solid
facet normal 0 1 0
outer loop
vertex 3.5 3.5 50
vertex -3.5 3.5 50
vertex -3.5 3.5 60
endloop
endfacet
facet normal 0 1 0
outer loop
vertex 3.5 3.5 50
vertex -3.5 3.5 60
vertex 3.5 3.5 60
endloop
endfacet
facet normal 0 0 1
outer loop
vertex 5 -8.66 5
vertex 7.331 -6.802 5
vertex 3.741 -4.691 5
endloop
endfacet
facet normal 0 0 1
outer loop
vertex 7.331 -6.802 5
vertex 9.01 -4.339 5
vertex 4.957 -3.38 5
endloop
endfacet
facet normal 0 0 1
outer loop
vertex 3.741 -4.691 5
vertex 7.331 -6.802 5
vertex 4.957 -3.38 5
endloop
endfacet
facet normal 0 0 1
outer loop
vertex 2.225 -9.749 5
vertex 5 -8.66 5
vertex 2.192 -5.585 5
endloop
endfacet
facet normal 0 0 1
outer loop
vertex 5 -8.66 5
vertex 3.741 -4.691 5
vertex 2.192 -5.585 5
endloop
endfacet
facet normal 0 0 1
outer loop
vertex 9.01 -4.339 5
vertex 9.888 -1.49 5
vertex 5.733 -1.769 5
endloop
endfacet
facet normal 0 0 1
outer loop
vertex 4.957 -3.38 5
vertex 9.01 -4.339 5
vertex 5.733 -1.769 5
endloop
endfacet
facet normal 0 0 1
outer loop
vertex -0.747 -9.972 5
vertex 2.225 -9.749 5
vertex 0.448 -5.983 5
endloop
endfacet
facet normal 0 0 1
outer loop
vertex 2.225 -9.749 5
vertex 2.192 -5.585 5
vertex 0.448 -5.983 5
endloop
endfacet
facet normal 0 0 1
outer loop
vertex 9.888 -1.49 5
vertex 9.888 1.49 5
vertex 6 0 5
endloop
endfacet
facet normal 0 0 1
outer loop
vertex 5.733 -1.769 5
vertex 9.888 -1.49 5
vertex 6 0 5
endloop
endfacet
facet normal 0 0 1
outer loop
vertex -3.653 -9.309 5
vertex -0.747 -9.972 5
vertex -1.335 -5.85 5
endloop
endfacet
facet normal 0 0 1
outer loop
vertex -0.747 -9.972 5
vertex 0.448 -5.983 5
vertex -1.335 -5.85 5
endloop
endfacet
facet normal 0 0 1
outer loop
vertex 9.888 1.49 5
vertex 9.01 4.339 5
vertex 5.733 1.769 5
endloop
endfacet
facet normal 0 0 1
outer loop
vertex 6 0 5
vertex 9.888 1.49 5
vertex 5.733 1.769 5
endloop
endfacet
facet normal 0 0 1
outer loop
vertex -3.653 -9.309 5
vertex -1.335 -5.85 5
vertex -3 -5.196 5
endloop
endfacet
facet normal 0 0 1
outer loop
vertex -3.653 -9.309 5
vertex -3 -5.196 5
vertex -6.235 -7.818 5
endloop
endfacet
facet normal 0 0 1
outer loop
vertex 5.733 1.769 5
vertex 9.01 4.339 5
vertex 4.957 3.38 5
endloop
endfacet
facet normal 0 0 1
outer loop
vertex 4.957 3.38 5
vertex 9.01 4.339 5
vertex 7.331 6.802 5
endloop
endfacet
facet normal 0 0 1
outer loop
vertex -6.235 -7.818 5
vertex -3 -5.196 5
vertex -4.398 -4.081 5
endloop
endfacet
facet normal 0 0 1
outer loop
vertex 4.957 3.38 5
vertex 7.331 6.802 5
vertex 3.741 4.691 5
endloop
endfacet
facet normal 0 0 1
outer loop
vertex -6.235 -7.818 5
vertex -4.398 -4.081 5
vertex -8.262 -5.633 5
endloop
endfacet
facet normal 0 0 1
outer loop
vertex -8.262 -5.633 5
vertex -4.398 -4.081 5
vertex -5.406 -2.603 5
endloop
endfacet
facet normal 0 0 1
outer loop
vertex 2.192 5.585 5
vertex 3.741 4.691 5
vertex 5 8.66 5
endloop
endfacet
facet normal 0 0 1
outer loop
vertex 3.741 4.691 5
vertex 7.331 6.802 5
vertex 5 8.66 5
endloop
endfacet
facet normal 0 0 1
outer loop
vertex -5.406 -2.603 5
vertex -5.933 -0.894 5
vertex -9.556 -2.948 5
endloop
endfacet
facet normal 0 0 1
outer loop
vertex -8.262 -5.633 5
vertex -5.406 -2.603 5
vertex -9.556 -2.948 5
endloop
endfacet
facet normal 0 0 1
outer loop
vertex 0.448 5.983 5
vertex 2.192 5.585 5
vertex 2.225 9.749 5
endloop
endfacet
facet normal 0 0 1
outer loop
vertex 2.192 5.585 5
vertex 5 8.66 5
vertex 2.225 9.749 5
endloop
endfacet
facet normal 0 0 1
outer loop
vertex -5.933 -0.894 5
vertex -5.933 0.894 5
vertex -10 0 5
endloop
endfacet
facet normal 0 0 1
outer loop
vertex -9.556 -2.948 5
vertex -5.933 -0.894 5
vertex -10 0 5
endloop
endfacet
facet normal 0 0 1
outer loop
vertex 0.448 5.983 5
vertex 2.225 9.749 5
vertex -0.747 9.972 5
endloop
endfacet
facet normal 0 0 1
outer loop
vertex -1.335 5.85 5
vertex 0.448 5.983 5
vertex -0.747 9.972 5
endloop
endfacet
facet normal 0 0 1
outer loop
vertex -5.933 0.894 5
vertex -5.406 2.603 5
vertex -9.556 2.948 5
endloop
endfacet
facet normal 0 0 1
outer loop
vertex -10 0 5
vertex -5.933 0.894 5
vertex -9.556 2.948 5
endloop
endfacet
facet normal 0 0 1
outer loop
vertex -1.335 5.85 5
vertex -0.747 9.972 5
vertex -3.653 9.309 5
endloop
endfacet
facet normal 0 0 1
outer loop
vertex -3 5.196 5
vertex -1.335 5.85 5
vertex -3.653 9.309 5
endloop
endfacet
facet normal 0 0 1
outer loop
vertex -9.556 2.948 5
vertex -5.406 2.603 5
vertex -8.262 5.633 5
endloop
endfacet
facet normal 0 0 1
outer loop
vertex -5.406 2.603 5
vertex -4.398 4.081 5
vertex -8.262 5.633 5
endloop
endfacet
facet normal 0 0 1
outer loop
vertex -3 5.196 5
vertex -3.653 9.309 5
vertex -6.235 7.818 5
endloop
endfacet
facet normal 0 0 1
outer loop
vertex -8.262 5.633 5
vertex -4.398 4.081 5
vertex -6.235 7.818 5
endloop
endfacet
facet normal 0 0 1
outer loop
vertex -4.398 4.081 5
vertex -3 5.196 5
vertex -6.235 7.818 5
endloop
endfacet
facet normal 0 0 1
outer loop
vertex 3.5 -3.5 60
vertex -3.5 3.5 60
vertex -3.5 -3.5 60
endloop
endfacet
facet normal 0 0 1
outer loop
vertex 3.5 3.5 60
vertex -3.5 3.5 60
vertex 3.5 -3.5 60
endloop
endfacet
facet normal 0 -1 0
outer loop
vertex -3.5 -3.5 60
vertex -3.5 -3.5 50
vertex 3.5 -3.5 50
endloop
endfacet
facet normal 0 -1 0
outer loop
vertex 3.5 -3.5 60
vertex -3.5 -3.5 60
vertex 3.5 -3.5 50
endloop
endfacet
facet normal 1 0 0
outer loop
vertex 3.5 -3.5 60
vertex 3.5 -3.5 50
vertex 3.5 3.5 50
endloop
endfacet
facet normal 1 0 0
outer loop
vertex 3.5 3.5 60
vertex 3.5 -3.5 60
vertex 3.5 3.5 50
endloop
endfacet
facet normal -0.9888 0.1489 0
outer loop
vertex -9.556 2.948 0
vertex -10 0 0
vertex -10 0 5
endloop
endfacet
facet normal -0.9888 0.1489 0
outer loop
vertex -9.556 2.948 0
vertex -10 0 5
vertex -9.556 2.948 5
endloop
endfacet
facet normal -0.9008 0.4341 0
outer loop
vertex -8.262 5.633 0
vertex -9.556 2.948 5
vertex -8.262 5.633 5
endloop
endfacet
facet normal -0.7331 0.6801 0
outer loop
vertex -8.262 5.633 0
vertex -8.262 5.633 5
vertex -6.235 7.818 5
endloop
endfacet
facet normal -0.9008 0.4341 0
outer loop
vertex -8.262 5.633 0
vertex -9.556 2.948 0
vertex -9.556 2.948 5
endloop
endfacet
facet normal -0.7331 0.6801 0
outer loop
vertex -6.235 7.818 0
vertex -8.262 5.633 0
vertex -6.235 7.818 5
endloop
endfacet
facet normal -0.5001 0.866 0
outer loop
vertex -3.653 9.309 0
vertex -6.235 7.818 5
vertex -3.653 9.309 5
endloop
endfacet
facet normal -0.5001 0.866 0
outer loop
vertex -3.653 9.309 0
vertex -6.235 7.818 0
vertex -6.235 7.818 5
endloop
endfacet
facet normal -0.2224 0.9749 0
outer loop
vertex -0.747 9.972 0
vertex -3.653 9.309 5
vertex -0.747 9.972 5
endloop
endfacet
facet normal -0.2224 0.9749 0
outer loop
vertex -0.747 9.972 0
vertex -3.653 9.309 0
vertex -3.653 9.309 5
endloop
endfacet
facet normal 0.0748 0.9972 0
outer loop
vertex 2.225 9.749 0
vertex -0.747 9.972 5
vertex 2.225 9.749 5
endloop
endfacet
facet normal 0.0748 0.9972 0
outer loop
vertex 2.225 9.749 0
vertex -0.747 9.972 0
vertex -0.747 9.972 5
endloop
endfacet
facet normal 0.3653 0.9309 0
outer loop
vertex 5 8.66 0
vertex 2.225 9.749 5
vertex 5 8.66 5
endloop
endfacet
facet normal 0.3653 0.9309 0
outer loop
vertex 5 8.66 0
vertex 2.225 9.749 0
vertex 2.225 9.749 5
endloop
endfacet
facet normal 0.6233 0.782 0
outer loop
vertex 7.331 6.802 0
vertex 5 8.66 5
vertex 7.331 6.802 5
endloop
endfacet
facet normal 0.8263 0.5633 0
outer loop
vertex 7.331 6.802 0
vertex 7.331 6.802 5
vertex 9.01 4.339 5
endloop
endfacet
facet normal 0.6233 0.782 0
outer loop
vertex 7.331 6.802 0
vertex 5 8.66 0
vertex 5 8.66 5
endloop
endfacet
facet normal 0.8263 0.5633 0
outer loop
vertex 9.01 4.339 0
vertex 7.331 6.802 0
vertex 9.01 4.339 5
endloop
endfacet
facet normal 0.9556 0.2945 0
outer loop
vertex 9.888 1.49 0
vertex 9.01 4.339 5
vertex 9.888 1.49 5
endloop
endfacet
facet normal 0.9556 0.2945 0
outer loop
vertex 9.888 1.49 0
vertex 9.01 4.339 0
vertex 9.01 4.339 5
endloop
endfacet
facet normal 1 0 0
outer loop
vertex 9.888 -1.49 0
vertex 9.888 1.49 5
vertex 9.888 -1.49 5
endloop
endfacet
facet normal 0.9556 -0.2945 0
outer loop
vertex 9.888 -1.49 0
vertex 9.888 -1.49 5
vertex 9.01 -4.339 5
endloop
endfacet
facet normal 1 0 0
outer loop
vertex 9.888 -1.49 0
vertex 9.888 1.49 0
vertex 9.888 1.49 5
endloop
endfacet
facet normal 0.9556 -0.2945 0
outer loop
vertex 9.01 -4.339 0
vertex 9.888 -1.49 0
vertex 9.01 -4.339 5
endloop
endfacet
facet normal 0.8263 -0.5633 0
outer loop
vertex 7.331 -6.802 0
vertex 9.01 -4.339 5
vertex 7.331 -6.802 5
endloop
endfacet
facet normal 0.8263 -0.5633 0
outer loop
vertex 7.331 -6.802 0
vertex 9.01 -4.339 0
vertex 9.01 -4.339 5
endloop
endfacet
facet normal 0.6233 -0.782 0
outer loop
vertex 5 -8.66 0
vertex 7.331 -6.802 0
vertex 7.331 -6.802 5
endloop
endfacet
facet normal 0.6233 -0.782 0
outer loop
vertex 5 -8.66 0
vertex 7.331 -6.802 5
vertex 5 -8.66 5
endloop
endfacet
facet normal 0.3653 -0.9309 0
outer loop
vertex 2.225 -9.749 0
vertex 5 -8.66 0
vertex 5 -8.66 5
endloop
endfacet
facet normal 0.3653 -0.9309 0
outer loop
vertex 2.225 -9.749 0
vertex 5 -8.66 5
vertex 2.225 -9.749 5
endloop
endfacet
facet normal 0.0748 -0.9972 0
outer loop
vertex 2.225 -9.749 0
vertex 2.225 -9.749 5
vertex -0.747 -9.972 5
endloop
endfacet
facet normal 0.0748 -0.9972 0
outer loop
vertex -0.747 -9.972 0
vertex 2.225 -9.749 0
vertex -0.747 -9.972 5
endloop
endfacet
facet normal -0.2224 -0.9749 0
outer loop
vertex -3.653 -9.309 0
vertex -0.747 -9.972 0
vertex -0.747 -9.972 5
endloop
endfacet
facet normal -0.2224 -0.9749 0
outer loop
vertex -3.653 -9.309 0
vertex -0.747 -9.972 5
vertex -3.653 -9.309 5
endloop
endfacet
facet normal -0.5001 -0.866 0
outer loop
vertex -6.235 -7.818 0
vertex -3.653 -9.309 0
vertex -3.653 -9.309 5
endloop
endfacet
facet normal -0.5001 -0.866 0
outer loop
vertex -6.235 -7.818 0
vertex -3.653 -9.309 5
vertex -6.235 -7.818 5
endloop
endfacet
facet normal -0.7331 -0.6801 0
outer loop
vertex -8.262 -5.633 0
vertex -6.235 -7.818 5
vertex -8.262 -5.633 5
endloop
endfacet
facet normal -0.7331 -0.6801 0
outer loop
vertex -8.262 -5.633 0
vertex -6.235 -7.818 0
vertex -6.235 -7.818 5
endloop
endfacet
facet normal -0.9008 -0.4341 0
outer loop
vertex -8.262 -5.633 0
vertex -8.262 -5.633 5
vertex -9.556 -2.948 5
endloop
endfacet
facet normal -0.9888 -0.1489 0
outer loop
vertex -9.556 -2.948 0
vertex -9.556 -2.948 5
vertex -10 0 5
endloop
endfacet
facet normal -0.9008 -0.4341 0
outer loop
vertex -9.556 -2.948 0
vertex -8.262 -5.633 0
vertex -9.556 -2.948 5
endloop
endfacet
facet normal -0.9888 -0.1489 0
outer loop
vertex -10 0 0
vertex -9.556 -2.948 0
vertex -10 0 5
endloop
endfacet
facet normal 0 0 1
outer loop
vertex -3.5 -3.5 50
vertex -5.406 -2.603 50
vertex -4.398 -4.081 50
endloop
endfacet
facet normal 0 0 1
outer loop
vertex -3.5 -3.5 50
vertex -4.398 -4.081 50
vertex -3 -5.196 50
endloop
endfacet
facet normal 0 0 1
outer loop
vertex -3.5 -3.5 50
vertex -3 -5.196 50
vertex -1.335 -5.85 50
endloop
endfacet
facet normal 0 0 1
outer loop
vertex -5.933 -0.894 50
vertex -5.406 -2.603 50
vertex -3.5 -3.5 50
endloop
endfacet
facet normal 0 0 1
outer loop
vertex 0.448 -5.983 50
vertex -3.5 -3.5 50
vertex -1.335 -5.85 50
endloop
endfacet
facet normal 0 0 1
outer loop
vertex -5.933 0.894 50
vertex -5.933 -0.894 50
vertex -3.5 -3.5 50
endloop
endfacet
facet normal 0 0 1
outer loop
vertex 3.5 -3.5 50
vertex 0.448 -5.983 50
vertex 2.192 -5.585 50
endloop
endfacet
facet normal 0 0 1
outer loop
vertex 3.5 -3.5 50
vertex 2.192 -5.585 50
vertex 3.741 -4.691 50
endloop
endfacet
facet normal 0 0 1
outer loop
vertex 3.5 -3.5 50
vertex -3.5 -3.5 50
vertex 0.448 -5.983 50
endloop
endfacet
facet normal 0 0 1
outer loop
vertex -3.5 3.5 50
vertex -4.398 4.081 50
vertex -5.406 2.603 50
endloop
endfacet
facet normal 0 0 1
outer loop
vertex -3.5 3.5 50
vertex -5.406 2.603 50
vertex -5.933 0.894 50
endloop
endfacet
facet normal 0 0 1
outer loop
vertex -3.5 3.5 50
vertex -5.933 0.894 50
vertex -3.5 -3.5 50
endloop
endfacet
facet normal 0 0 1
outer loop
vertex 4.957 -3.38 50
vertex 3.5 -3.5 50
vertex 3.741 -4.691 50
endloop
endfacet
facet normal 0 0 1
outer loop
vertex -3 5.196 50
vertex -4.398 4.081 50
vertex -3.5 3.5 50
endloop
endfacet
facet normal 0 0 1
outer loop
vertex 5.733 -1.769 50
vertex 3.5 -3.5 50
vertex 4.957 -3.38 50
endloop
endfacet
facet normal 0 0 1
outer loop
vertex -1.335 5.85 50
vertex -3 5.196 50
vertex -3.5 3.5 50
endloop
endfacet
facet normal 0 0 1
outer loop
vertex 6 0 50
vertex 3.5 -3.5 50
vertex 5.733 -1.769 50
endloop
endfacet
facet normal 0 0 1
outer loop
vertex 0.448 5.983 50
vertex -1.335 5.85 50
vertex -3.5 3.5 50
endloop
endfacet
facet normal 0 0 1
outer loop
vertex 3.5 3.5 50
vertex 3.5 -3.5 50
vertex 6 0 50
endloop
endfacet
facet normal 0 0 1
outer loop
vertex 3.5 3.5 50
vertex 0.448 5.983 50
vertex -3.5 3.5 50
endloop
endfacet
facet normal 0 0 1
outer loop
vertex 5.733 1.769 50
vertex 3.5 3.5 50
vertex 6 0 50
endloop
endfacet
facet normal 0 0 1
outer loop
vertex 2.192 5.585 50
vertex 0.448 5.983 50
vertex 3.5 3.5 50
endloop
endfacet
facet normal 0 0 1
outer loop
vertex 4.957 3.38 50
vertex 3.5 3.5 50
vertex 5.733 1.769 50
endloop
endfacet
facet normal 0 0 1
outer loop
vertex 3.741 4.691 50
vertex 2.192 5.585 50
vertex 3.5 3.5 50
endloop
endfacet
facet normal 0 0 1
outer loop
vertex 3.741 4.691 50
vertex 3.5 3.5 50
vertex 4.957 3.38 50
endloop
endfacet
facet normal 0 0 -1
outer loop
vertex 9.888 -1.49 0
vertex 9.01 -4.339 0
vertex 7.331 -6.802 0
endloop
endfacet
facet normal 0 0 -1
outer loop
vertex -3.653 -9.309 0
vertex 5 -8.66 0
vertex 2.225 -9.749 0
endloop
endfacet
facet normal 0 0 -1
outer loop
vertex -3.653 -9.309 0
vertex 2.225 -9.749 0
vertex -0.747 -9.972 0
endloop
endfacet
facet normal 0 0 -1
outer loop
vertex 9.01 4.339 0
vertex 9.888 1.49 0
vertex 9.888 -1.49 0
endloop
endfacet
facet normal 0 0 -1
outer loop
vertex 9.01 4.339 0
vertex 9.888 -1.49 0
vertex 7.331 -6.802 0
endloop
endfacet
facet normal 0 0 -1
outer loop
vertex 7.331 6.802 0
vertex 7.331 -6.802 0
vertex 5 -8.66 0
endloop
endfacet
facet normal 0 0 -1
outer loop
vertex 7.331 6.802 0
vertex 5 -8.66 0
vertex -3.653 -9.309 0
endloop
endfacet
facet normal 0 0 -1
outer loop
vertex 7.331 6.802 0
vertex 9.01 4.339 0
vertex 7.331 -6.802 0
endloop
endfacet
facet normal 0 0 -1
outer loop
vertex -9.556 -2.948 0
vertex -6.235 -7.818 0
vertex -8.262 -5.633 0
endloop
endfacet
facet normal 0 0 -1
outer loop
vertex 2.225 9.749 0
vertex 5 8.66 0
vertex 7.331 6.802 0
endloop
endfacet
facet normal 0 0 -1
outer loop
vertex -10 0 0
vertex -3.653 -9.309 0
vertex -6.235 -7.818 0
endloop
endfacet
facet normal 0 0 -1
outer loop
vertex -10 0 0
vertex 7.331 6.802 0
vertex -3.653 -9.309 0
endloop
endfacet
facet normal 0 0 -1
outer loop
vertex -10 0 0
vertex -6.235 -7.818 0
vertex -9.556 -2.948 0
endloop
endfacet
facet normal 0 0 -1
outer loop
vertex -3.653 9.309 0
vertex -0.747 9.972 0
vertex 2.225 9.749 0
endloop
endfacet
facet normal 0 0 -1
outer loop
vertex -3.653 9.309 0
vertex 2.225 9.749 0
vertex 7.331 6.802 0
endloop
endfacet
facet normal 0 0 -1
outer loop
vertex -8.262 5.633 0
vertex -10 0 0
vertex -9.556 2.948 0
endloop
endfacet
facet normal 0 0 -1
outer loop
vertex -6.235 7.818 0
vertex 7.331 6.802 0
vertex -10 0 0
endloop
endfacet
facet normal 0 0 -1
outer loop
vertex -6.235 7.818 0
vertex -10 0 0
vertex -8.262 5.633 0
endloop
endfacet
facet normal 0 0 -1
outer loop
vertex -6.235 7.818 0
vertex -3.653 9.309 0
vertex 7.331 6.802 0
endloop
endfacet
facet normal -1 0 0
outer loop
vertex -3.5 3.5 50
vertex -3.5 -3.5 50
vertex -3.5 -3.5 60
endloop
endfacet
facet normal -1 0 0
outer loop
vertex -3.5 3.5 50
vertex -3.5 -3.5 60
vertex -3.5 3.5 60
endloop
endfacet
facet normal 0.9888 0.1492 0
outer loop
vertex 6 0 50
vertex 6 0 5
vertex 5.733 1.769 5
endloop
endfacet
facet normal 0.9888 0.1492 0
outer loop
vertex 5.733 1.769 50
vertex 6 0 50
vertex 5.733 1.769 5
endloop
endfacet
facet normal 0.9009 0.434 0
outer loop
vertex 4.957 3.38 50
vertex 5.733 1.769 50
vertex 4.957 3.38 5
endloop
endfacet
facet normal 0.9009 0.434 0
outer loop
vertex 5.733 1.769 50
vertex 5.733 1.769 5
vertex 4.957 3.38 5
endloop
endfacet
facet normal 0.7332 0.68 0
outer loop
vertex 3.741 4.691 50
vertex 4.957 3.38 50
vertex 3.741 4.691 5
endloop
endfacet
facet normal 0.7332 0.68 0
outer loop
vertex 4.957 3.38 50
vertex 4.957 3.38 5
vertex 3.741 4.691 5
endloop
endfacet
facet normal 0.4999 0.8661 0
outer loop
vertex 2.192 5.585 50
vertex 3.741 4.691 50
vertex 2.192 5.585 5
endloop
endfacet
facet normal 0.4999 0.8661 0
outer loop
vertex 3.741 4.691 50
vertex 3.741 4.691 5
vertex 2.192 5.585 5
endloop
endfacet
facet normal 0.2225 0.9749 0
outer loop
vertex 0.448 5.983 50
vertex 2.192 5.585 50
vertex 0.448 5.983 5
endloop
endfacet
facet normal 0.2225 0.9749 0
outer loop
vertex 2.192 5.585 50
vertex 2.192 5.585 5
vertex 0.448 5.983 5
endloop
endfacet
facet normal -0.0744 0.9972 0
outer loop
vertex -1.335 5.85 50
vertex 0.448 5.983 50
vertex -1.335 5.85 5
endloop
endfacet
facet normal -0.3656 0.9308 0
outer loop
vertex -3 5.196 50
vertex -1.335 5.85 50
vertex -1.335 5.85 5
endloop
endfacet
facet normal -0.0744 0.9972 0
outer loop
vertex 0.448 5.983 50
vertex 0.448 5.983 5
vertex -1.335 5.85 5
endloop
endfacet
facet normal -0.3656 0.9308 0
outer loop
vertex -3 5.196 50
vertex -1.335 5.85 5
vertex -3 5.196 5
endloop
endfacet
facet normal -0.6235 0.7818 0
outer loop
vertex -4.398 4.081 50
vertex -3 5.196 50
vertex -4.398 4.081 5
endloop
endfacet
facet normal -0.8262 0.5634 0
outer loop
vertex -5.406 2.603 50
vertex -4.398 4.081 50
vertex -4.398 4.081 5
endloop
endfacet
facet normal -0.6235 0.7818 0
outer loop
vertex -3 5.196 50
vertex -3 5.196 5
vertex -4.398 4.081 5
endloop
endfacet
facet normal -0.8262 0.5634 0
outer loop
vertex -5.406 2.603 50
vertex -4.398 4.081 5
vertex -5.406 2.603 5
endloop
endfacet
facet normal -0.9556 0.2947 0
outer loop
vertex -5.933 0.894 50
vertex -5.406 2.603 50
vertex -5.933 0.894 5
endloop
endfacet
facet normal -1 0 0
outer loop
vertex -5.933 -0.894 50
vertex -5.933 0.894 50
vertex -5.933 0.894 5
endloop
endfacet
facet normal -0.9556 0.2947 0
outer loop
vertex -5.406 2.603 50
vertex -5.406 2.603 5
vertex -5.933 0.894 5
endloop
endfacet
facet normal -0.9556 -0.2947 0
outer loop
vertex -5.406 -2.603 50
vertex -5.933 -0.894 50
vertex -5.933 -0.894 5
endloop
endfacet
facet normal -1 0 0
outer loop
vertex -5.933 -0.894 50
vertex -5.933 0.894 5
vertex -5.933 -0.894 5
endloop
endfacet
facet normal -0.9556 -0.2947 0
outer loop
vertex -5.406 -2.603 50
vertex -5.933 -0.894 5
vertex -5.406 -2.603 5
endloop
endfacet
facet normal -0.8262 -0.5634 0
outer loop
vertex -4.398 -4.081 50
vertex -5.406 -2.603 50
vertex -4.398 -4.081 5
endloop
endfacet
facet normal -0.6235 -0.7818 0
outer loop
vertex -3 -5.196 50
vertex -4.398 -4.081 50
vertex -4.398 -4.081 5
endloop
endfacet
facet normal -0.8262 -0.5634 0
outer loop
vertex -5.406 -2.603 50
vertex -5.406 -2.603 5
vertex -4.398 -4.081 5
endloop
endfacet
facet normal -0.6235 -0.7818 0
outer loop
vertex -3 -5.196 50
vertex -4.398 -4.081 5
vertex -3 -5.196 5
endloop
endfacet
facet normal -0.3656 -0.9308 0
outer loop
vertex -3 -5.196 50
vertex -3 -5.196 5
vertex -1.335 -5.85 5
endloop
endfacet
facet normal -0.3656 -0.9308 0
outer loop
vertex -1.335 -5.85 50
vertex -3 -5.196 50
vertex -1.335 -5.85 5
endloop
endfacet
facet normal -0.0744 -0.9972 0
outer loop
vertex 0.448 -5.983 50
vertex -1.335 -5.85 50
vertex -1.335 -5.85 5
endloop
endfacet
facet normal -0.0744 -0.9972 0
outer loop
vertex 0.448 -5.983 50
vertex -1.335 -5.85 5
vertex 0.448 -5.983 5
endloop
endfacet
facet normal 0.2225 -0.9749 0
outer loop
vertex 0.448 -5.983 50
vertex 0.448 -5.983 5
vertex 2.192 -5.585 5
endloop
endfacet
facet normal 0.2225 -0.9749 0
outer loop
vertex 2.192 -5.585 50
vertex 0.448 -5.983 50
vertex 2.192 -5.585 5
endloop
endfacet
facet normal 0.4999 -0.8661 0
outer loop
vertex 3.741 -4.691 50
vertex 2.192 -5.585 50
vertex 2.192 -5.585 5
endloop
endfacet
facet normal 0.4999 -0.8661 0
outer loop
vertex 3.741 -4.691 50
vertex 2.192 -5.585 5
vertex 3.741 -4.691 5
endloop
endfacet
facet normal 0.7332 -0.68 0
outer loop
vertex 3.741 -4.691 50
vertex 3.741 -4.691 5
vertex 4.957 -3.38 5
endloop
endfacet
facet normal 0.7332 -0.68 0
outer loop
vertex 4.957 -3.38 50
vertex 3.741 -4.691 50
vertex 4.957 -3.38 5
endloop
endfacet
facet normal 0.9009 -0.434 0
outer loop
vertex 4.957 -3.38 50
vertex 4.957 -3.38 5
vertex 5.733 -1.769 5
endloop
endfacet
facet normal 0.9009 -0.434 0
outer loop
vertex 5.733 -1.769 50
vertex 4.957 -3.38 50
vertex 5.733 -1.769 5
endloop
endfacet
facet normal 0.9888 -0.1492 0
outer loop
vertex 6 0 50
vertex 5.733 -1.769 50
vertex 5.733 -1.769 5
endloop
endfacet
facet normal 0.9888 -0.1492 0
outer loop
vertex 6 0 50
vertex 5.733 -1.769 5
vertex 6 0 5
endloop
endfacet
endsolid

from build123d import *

# Parameters (mm, degrees)
SKETCH1_R           = 6
BOSS_EXTRUDE1_DEPTH = 50
SKETCH2_R           = 10
BOSS_EXTRUDE2_DEPTH = 5
SKETCH3_W           = 7
SKETCH3_H           = 7
BOSS_EXTRUDE3_DEPTH = 10


with BuildPart() as part:
    # Sketch1 → Boss-Extrude1 (new body)
    with BuildSketch(Plane.XY):
        Circle(SKETCH1_R)
    extrude(amount=BOSS_EXTRUDE1_DEPTH)

    # Sketch2 → Boss-Extrude2 (add)
    with BuildSketch(Plane(origin=(0, 0, 0), x_dir=(-1, 0, 0), z_dir=(0, 0, -1))):
        Circle(SKETCH2_R)
    extrude(amount=-BOSS_EXTRUDE2_DEPTH)

    # Sketch3 → Boss-Extrude3 (add)
    with BuildSketch(Plane.XY.offset(50)):
        Rectangle(SKETCH3_W, SKETCH3_H)
    extrude(amount=BOSS_EXTRUDE3_DEPTH)


solid = part.part
